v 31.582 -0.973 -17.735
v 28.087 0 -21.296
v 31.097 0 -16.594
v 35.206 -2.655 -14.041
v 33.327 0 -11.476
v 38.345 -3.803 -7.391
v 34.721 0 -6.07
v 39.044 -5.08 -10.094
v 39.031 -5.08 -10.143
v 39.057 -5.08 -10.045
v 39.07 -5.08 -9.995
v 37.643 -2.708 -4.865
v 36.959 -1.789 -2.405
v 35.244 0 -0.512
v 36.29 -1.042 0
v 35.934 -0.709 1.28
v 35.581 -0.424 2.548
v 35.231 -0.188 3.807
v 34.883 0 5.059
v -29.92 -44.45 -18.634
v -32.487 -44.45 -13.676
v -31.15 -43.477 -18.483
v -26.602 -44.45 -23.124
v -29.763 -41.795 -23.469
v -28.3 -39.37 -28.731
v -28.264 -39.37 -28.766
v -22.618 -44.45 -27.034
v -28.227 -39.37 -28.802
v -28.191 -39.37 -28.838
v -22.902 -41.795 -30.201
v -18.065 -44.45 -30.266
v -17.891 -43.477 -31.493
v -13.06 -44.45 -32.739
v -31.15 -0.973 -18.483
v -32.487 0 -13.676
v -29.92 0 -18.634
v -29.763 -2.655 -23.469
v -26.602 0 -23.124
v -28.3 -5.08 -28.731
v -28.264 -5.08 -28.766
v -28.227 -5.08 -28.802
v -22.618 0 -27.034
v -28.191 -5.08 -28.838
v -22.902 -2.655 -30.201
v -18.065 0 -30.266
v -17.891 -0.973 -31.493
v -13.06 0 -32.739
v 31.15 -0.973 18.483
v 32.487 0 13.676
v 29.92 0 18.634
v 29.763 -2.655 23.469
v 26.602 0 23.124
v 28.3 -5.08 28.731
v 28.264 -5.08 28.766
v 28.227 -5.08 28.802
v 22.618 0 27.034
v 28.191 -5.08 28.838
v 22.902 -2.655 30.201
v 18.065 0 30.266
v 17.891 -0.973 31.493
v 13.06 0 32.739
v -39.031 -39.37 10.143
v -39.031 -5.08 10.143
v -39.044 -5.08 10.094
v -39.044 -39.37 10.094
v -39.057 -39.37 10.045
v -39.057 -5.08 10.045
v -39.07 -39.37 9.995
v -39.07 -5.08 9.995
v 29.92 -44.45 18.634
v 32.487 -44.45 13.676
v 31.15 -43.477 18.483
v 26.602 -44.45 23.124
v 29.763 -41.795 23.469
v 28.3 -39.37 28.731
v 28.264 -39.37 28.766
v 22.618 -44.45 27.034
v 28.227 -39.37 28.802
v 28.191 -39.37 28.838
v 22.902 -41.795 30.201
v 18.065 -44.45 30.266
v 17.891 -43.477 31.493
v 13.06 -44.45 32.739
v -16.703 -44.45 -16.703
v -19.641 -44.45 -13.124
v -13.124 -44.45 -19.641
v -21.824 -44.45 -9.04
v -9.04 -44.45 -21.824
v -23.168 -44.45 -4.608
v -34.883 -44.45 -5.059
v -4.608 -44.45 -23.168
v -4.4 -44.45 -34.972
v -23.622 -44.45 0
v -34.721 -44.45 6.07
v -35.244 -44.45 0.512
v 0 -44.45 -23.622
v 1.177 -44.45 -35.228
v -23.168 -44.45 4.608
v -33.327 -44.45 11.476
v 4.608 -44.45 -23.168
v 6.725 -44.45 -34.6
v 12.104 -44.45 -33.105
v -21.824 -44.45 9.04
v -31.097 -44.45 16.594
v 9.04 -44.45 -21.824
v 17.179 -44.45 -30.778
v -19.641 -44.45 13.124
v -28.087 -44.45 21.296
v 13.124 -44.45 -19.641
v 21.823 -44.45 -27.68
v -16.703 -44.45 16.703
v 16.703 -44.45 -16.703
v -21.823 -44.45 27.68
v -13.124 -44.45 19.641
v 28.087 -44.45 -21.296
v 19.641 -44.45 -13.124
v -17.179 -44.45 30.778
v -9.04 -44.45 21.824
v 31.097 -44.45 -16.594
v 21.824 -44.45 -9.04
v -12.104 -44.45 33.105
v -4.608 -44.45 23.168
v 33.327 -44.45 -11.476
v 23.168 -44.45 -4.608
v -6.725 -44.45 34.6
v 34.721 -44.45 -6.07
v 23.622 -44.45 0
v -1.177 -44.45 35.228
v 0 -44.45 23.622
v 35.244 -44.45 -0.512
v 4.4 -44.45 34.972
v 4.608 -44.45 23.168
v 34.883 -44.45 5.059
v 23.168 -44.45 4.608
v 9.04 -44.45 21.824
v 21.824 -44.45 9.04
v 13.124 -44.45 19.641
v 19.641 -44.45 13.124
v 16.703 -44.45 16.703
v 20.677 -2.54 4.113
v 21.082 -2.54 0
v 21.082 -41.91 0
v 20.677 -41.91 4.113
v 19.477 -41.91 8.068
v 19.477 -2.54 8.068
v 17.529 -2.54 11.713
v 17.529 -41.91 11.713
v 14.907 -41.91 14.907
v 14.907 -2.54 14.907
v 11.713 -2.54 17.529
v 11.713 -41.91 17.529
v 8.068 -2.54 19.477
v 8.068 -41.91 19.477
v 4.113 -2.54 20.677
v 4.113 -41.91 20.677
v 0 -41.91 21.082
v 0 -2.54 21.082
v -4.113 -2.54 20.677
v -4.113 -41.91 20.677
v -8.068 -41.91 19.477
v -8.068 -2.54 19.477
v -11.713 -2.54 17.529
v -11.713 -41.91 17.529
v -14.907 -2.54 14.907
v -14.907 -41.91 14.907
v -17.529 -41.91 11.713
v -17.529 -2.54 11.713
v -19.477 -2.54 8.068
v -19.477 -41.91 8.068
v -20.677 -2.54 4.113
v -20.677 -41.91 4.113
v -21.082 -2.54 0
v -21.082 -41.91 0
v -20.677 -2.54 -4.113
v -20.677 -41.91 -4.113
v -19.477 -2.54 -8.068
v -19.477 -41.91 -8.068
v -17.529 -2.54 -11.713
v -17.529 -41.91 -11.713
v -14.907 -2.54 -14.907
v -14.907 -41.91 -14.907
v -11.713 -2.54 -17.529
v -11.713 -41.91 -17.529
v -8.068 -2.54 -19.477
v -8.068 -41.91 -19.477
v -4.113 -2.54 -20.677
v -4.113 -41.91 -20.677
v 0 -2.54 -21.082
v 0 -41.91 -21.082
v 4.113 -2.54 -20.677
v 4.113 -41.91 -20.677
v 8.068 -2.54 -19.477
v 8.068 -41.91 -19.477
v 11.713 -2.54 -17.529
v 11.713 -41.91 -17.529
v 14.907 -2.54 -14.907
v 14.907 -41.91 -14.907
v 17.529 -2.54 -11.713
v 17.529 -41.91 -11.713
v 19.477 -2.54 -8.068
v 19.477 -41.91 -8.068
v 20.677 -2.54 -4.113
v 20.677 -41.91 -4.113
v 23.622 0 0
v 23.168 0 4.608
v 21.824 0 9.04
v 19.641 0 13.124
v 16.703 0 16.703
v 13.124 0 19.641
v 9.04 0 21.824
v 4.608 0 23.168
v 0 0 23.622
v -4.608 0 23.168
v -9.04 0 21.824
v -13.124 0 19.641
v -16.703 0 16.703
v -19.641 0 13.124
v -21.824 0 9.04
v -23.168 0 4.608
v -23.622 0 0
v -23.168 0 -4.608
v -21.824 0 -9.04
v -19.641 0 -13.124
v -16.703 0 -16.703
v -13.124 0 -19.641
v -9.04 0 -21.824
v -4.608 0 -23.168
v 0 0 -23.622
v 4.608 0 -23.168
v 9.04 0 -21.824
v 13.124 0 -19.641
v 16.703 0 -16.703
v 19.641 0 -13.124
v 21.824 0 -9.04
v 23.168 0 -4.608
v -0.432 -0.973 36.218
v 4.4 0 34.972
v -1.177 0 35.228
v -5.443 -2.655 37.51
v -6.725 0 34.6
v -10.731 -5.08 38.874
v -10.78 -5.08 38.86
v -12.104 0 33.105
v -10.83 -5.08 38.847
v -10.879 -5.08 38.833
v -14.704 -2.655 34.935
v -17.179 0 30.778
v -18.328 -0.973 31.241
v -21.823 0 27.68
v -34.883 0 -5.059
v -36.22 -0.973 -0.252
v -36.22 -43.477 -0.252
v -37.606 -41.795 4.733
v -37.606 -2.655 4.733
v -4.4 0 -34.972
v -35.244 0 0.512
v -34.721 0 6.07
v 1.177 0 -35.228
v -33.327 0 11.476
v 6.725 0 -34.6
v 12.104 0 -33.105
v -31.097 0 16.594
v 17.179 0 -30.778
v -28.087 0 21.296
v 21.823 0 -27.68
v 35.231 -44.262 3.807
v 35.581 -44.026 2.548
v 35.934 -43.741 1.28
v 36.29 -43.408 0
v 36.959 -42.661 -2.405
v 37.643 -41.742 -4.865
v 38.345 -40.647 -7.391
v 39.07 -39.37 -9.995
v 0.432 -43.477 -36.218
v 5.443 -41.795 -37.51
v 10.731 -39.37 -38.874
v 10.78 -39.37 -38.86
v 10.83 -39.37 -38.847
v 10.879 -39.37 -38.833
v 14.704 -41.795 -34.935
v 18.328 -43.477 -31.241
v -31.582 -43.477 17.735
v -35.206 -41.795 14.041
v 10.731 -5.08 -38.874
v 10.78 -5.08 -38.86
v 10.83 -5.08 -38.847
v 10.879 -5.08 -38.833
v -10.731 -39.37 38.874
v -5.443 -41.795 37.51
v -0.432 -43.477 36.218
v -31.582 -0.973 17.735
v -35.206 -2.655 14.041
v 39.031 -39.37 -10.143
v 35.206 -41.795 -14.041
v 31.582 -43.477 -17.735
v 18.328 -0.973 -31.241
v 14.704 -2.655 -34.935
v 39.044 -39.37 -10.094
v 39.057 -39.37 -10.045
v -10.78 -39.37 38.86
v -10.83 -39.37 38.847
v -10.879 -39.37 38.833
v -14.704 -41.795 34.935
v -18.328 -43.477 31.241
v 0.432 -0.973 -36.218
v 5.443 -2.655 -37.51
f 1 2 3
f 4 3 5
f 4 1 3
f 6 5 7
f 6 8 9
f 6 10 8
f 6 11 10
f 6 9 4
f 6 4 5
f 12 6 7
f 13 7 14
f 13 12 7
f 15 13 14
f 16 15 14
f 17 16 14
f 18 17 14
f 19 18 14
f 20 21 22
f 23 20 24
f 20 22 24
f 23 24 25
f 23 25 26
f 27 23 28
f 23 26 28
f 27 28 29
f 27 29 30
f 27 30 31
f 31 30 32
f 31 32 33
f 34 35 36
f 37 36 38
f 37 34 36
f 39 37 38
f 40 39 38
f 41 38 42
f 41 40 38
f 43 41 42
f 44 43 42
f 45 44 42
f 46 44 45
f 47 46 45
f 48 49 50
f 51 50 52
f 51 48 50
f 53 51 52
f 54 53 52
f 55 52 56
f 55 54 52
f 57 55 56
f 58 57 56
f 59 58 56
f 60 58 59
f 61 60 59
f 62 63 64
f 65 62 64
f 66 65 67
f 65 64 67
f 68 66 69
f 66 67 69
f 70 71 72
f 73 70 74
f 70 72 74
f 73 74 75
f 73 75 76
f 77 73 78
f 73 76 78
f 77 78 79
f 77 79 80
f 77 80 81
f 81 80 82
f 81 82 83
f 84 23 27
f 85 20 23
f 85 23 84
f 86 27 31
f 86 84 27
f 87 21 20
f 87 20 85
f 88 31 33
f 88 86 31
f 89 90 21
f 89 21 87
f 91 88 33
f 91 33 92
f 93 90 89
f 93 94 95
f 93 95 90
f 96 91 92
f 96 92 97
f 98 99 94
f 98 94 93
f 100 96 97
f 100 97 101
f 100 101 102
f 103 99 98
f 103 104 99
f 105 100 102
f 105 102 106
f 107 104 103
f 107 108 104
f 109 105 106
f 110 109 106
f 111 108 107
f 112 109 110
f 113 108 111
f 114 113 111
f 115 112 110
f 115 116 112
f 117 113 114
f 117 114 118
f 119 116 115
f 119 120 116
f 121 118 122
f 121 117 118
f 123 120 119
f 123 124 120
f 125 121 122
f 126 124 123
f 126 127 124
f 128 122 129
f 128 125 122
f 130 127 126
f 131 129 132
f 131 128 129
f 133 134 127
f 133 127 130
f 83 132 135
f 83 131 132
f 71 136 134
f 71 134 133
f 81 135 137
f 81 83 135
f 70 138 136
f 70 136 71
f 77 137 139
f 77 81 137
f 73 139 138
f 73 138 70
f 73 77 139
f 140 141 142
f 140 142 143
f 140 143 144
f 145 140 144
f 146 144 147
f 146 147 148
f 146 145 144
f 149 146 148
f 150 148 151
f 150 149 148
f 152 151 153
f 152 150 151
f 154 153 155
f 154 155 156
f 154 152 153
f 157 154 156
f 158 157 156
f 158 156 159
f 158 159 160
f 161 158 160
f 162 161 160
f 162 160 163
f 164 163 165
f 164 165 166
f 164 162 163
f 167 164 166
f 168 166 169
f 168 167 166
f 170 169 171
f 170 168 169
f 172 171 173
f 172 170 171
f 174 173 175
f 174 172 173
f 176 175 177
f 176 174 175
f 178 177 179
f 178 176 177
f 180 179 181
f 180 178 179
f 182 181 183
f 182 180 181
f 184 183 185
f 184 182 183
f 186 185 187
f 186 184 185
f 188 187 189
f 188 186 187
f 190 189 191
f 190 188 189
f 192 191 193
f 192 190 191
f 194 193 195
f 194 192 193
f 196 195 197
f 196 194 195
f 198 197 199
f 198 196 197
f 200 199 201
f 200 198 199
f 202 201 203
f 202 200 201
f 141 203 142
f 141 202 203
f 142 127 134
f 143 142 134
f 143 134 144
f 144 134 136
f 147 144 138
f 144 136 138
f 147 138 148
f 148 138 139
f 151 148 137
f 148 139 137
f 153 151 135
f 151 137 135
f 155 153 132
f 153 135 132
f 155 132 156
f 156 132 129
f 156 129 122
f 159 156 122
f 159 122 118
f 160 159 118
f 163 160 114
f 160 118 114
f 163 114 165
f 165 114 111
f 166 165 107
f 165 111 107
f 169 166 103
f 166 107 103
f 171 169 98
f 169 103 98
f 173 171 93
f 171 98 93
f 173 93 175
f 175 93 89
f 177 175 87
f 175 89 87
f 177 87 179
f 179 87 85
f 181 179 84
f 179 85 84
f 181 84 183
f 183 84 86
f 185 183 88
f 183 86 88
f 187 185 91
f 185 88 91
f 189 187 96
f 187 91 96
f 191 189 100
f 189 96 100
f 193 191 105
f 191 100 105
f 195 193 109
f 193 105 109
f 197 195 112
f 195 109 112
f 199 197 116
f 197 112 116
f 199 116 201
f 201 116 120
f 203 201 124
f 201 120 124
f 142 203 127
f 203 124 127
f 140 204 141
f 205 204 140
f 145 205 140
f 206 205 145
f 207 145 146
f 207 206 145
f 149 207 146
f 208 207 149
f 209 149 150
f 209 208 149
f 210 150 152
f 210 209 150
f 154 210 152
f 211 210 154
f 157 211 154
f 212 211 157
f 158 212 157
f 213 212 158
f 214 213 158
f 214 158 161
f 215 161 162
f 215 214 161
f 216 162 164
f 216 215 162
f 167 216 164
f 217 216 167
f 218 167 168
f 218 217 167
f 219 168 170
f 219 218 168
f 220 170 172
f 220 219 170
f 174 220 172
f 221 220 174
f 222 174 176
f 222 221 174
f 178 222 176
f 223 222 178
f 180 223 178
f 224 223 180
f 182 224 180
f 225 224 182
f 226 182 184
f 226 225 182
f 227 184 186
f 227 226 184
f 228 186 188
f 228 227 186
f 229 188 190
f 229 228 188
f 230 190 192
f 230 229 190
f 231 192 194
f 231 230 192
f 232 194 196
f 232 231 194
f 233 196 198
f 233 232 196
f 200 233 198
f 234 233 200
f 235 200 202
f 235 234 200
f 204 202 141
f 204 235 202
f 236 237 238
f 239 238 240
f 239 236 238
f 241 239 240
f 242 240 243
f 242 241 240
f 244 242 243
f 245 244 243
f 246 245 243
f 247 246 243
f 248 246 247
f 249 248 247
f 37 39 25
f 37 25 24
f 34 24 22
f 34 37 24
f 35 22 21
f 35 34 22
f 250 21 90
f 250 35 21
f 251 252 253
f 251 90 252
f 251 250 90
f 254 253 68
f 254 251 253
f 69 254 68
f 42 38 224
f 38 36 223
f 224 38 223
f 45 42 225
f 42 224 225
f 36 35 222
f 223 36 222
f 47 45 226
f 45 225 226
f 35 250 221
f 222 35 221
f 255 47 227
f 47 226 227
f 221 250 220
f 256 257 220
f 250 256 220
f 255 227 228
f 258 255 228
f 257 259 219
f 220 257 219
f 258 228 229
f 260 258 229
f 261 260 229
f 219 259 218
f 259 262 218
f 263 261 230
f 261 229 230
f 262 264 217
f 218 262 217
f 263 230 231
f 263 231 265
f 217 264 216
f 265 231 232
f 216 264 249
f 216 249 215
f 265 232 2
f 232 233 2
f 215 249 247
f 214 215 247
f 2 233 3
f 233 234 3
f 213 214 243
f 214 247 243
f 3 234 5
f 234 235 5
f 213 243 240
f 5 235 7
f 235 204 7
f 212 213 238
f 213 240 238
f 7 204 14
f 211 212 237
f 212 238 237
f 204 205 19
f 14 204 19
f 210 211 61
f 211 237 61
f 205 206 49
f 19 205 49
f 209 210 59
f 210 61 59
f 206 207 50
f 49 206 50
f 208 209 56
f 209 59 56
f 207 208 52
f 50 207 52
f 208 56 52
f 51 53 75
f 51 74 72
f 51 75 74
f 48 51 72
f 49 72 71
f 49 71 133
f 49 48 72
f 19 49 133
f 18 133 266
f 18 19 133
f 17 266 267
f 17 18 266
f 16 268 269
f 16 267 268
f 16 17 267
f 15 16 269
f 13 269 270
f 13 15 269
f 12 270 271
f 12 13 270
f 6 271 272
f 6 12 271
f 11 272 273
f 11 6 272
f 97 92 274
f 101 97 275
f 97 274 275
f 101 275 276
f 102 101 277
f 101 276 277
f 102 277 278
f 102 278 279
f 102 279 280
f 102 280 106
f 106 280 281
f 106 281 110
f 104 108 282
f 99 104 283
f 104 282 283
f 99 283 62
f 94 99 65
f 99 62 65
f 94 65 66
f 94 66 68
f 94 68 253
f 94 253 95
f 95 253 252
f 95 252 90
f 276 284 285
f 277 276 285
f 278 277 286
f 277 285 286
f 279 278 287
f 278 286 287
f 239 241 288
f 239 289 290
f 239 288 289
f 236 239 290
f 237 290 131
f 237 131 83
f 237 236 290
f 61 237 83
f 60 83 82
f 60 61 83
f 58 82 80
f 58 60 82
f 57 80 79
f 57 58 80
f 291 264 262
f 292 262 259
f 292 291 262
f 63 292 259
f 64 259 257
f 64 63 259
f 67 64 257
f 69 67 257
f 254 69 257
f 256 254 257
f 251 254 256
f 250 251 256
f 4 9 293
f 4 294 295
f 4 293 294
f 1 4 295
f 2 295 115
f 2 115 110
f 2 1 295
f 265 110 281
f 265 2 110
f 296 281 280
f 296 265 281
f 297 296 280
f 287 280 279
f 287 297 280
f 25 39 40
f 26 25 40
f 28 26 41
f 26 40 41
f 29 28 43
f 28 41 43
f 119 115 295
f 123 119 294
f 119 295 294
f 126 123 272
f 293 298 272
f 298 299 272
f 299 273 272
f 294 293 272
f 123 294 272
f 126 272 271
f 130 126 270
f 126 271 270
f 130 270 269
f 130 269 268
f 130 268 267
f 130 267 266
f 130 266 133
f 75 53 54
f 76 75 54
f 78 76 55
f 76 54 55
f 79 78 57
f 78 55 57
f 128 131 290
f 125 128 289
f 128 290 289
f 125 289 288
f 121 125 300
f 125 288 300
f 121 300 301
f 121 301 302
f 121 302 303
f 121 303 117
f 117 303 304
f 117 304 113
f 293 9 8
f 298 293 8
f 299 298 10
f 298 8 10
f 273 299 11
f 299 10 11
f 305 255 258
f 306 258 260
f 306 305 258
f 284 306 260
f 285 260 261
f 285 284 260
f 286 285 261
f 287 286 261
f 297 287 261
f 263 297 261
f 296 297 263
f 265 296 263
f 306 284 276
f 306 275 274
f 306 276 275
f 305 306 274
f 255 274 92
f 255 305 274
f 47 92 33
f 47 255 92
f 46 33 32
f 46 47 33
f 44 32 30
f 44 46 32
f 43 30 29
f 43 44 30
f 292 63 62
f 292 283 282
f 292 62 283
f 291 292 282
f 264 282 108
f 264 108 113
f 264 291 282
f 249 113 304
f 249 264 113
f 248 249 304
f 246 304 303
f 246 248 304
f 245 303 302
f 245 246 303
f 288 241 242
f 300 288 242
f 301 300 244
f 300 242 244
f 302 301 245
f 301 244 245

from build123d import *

# Parameters (mm, degrees)
F0_R     = 40.327916
F0_R_2   = 21.082
F1_DEPTH = 44.45
F2_SIZE  = 2.54
F3_SIZE  = 5.08
F4_R     = 69.994365
F5_DEPTH = 44.451


with BuildPart() as f1:
    # F0 (on Front) → F1 (new body)
    with BuildSketch(Plane.XZ):
        Circle(F0_R)
        Circle(F0_R_2, mode=Mode.SUBTRACT)
    extrude(amount=F1_DEPTH)

    # F2
    f2_edges = [f1.edges().sort_by_distance(p)[0] for p in [
        (21.082, -22.225, 0),
        (-21.082, 0, 0),
        (-21.082, -44.45, 0),
    ]]
    chamfer(f2_edges, length=F2_SIZE)

    # F3
    f3_edges = [f1.edges().sort_by_distance(p)[0] for p in [
        (40.327916, -22.225, 0),
        (-40.327916, 0, 0),
        (-40.327916, -44.45, 0),
    ]]
    chamfer(f3_edges, length=F3_SIZE)

    # F4 (on Front) → F5 (cut, through all)
    with BuildSketch(Plane.XZ):
        Circle(F4_R)
        Polygon((28.276404, 28.815554), (39.093203, -10.080307), (10.8168, -38.895861), (-28.276404, -28.815554), (-39.093203, 10.080307), (-10.8168, 38.895861), align=None, mode=Mode.SUBTRACT)
    extrude(amount=F5_DEPTH, mode=Mode.SUBTRACT)


solid = f1.part
